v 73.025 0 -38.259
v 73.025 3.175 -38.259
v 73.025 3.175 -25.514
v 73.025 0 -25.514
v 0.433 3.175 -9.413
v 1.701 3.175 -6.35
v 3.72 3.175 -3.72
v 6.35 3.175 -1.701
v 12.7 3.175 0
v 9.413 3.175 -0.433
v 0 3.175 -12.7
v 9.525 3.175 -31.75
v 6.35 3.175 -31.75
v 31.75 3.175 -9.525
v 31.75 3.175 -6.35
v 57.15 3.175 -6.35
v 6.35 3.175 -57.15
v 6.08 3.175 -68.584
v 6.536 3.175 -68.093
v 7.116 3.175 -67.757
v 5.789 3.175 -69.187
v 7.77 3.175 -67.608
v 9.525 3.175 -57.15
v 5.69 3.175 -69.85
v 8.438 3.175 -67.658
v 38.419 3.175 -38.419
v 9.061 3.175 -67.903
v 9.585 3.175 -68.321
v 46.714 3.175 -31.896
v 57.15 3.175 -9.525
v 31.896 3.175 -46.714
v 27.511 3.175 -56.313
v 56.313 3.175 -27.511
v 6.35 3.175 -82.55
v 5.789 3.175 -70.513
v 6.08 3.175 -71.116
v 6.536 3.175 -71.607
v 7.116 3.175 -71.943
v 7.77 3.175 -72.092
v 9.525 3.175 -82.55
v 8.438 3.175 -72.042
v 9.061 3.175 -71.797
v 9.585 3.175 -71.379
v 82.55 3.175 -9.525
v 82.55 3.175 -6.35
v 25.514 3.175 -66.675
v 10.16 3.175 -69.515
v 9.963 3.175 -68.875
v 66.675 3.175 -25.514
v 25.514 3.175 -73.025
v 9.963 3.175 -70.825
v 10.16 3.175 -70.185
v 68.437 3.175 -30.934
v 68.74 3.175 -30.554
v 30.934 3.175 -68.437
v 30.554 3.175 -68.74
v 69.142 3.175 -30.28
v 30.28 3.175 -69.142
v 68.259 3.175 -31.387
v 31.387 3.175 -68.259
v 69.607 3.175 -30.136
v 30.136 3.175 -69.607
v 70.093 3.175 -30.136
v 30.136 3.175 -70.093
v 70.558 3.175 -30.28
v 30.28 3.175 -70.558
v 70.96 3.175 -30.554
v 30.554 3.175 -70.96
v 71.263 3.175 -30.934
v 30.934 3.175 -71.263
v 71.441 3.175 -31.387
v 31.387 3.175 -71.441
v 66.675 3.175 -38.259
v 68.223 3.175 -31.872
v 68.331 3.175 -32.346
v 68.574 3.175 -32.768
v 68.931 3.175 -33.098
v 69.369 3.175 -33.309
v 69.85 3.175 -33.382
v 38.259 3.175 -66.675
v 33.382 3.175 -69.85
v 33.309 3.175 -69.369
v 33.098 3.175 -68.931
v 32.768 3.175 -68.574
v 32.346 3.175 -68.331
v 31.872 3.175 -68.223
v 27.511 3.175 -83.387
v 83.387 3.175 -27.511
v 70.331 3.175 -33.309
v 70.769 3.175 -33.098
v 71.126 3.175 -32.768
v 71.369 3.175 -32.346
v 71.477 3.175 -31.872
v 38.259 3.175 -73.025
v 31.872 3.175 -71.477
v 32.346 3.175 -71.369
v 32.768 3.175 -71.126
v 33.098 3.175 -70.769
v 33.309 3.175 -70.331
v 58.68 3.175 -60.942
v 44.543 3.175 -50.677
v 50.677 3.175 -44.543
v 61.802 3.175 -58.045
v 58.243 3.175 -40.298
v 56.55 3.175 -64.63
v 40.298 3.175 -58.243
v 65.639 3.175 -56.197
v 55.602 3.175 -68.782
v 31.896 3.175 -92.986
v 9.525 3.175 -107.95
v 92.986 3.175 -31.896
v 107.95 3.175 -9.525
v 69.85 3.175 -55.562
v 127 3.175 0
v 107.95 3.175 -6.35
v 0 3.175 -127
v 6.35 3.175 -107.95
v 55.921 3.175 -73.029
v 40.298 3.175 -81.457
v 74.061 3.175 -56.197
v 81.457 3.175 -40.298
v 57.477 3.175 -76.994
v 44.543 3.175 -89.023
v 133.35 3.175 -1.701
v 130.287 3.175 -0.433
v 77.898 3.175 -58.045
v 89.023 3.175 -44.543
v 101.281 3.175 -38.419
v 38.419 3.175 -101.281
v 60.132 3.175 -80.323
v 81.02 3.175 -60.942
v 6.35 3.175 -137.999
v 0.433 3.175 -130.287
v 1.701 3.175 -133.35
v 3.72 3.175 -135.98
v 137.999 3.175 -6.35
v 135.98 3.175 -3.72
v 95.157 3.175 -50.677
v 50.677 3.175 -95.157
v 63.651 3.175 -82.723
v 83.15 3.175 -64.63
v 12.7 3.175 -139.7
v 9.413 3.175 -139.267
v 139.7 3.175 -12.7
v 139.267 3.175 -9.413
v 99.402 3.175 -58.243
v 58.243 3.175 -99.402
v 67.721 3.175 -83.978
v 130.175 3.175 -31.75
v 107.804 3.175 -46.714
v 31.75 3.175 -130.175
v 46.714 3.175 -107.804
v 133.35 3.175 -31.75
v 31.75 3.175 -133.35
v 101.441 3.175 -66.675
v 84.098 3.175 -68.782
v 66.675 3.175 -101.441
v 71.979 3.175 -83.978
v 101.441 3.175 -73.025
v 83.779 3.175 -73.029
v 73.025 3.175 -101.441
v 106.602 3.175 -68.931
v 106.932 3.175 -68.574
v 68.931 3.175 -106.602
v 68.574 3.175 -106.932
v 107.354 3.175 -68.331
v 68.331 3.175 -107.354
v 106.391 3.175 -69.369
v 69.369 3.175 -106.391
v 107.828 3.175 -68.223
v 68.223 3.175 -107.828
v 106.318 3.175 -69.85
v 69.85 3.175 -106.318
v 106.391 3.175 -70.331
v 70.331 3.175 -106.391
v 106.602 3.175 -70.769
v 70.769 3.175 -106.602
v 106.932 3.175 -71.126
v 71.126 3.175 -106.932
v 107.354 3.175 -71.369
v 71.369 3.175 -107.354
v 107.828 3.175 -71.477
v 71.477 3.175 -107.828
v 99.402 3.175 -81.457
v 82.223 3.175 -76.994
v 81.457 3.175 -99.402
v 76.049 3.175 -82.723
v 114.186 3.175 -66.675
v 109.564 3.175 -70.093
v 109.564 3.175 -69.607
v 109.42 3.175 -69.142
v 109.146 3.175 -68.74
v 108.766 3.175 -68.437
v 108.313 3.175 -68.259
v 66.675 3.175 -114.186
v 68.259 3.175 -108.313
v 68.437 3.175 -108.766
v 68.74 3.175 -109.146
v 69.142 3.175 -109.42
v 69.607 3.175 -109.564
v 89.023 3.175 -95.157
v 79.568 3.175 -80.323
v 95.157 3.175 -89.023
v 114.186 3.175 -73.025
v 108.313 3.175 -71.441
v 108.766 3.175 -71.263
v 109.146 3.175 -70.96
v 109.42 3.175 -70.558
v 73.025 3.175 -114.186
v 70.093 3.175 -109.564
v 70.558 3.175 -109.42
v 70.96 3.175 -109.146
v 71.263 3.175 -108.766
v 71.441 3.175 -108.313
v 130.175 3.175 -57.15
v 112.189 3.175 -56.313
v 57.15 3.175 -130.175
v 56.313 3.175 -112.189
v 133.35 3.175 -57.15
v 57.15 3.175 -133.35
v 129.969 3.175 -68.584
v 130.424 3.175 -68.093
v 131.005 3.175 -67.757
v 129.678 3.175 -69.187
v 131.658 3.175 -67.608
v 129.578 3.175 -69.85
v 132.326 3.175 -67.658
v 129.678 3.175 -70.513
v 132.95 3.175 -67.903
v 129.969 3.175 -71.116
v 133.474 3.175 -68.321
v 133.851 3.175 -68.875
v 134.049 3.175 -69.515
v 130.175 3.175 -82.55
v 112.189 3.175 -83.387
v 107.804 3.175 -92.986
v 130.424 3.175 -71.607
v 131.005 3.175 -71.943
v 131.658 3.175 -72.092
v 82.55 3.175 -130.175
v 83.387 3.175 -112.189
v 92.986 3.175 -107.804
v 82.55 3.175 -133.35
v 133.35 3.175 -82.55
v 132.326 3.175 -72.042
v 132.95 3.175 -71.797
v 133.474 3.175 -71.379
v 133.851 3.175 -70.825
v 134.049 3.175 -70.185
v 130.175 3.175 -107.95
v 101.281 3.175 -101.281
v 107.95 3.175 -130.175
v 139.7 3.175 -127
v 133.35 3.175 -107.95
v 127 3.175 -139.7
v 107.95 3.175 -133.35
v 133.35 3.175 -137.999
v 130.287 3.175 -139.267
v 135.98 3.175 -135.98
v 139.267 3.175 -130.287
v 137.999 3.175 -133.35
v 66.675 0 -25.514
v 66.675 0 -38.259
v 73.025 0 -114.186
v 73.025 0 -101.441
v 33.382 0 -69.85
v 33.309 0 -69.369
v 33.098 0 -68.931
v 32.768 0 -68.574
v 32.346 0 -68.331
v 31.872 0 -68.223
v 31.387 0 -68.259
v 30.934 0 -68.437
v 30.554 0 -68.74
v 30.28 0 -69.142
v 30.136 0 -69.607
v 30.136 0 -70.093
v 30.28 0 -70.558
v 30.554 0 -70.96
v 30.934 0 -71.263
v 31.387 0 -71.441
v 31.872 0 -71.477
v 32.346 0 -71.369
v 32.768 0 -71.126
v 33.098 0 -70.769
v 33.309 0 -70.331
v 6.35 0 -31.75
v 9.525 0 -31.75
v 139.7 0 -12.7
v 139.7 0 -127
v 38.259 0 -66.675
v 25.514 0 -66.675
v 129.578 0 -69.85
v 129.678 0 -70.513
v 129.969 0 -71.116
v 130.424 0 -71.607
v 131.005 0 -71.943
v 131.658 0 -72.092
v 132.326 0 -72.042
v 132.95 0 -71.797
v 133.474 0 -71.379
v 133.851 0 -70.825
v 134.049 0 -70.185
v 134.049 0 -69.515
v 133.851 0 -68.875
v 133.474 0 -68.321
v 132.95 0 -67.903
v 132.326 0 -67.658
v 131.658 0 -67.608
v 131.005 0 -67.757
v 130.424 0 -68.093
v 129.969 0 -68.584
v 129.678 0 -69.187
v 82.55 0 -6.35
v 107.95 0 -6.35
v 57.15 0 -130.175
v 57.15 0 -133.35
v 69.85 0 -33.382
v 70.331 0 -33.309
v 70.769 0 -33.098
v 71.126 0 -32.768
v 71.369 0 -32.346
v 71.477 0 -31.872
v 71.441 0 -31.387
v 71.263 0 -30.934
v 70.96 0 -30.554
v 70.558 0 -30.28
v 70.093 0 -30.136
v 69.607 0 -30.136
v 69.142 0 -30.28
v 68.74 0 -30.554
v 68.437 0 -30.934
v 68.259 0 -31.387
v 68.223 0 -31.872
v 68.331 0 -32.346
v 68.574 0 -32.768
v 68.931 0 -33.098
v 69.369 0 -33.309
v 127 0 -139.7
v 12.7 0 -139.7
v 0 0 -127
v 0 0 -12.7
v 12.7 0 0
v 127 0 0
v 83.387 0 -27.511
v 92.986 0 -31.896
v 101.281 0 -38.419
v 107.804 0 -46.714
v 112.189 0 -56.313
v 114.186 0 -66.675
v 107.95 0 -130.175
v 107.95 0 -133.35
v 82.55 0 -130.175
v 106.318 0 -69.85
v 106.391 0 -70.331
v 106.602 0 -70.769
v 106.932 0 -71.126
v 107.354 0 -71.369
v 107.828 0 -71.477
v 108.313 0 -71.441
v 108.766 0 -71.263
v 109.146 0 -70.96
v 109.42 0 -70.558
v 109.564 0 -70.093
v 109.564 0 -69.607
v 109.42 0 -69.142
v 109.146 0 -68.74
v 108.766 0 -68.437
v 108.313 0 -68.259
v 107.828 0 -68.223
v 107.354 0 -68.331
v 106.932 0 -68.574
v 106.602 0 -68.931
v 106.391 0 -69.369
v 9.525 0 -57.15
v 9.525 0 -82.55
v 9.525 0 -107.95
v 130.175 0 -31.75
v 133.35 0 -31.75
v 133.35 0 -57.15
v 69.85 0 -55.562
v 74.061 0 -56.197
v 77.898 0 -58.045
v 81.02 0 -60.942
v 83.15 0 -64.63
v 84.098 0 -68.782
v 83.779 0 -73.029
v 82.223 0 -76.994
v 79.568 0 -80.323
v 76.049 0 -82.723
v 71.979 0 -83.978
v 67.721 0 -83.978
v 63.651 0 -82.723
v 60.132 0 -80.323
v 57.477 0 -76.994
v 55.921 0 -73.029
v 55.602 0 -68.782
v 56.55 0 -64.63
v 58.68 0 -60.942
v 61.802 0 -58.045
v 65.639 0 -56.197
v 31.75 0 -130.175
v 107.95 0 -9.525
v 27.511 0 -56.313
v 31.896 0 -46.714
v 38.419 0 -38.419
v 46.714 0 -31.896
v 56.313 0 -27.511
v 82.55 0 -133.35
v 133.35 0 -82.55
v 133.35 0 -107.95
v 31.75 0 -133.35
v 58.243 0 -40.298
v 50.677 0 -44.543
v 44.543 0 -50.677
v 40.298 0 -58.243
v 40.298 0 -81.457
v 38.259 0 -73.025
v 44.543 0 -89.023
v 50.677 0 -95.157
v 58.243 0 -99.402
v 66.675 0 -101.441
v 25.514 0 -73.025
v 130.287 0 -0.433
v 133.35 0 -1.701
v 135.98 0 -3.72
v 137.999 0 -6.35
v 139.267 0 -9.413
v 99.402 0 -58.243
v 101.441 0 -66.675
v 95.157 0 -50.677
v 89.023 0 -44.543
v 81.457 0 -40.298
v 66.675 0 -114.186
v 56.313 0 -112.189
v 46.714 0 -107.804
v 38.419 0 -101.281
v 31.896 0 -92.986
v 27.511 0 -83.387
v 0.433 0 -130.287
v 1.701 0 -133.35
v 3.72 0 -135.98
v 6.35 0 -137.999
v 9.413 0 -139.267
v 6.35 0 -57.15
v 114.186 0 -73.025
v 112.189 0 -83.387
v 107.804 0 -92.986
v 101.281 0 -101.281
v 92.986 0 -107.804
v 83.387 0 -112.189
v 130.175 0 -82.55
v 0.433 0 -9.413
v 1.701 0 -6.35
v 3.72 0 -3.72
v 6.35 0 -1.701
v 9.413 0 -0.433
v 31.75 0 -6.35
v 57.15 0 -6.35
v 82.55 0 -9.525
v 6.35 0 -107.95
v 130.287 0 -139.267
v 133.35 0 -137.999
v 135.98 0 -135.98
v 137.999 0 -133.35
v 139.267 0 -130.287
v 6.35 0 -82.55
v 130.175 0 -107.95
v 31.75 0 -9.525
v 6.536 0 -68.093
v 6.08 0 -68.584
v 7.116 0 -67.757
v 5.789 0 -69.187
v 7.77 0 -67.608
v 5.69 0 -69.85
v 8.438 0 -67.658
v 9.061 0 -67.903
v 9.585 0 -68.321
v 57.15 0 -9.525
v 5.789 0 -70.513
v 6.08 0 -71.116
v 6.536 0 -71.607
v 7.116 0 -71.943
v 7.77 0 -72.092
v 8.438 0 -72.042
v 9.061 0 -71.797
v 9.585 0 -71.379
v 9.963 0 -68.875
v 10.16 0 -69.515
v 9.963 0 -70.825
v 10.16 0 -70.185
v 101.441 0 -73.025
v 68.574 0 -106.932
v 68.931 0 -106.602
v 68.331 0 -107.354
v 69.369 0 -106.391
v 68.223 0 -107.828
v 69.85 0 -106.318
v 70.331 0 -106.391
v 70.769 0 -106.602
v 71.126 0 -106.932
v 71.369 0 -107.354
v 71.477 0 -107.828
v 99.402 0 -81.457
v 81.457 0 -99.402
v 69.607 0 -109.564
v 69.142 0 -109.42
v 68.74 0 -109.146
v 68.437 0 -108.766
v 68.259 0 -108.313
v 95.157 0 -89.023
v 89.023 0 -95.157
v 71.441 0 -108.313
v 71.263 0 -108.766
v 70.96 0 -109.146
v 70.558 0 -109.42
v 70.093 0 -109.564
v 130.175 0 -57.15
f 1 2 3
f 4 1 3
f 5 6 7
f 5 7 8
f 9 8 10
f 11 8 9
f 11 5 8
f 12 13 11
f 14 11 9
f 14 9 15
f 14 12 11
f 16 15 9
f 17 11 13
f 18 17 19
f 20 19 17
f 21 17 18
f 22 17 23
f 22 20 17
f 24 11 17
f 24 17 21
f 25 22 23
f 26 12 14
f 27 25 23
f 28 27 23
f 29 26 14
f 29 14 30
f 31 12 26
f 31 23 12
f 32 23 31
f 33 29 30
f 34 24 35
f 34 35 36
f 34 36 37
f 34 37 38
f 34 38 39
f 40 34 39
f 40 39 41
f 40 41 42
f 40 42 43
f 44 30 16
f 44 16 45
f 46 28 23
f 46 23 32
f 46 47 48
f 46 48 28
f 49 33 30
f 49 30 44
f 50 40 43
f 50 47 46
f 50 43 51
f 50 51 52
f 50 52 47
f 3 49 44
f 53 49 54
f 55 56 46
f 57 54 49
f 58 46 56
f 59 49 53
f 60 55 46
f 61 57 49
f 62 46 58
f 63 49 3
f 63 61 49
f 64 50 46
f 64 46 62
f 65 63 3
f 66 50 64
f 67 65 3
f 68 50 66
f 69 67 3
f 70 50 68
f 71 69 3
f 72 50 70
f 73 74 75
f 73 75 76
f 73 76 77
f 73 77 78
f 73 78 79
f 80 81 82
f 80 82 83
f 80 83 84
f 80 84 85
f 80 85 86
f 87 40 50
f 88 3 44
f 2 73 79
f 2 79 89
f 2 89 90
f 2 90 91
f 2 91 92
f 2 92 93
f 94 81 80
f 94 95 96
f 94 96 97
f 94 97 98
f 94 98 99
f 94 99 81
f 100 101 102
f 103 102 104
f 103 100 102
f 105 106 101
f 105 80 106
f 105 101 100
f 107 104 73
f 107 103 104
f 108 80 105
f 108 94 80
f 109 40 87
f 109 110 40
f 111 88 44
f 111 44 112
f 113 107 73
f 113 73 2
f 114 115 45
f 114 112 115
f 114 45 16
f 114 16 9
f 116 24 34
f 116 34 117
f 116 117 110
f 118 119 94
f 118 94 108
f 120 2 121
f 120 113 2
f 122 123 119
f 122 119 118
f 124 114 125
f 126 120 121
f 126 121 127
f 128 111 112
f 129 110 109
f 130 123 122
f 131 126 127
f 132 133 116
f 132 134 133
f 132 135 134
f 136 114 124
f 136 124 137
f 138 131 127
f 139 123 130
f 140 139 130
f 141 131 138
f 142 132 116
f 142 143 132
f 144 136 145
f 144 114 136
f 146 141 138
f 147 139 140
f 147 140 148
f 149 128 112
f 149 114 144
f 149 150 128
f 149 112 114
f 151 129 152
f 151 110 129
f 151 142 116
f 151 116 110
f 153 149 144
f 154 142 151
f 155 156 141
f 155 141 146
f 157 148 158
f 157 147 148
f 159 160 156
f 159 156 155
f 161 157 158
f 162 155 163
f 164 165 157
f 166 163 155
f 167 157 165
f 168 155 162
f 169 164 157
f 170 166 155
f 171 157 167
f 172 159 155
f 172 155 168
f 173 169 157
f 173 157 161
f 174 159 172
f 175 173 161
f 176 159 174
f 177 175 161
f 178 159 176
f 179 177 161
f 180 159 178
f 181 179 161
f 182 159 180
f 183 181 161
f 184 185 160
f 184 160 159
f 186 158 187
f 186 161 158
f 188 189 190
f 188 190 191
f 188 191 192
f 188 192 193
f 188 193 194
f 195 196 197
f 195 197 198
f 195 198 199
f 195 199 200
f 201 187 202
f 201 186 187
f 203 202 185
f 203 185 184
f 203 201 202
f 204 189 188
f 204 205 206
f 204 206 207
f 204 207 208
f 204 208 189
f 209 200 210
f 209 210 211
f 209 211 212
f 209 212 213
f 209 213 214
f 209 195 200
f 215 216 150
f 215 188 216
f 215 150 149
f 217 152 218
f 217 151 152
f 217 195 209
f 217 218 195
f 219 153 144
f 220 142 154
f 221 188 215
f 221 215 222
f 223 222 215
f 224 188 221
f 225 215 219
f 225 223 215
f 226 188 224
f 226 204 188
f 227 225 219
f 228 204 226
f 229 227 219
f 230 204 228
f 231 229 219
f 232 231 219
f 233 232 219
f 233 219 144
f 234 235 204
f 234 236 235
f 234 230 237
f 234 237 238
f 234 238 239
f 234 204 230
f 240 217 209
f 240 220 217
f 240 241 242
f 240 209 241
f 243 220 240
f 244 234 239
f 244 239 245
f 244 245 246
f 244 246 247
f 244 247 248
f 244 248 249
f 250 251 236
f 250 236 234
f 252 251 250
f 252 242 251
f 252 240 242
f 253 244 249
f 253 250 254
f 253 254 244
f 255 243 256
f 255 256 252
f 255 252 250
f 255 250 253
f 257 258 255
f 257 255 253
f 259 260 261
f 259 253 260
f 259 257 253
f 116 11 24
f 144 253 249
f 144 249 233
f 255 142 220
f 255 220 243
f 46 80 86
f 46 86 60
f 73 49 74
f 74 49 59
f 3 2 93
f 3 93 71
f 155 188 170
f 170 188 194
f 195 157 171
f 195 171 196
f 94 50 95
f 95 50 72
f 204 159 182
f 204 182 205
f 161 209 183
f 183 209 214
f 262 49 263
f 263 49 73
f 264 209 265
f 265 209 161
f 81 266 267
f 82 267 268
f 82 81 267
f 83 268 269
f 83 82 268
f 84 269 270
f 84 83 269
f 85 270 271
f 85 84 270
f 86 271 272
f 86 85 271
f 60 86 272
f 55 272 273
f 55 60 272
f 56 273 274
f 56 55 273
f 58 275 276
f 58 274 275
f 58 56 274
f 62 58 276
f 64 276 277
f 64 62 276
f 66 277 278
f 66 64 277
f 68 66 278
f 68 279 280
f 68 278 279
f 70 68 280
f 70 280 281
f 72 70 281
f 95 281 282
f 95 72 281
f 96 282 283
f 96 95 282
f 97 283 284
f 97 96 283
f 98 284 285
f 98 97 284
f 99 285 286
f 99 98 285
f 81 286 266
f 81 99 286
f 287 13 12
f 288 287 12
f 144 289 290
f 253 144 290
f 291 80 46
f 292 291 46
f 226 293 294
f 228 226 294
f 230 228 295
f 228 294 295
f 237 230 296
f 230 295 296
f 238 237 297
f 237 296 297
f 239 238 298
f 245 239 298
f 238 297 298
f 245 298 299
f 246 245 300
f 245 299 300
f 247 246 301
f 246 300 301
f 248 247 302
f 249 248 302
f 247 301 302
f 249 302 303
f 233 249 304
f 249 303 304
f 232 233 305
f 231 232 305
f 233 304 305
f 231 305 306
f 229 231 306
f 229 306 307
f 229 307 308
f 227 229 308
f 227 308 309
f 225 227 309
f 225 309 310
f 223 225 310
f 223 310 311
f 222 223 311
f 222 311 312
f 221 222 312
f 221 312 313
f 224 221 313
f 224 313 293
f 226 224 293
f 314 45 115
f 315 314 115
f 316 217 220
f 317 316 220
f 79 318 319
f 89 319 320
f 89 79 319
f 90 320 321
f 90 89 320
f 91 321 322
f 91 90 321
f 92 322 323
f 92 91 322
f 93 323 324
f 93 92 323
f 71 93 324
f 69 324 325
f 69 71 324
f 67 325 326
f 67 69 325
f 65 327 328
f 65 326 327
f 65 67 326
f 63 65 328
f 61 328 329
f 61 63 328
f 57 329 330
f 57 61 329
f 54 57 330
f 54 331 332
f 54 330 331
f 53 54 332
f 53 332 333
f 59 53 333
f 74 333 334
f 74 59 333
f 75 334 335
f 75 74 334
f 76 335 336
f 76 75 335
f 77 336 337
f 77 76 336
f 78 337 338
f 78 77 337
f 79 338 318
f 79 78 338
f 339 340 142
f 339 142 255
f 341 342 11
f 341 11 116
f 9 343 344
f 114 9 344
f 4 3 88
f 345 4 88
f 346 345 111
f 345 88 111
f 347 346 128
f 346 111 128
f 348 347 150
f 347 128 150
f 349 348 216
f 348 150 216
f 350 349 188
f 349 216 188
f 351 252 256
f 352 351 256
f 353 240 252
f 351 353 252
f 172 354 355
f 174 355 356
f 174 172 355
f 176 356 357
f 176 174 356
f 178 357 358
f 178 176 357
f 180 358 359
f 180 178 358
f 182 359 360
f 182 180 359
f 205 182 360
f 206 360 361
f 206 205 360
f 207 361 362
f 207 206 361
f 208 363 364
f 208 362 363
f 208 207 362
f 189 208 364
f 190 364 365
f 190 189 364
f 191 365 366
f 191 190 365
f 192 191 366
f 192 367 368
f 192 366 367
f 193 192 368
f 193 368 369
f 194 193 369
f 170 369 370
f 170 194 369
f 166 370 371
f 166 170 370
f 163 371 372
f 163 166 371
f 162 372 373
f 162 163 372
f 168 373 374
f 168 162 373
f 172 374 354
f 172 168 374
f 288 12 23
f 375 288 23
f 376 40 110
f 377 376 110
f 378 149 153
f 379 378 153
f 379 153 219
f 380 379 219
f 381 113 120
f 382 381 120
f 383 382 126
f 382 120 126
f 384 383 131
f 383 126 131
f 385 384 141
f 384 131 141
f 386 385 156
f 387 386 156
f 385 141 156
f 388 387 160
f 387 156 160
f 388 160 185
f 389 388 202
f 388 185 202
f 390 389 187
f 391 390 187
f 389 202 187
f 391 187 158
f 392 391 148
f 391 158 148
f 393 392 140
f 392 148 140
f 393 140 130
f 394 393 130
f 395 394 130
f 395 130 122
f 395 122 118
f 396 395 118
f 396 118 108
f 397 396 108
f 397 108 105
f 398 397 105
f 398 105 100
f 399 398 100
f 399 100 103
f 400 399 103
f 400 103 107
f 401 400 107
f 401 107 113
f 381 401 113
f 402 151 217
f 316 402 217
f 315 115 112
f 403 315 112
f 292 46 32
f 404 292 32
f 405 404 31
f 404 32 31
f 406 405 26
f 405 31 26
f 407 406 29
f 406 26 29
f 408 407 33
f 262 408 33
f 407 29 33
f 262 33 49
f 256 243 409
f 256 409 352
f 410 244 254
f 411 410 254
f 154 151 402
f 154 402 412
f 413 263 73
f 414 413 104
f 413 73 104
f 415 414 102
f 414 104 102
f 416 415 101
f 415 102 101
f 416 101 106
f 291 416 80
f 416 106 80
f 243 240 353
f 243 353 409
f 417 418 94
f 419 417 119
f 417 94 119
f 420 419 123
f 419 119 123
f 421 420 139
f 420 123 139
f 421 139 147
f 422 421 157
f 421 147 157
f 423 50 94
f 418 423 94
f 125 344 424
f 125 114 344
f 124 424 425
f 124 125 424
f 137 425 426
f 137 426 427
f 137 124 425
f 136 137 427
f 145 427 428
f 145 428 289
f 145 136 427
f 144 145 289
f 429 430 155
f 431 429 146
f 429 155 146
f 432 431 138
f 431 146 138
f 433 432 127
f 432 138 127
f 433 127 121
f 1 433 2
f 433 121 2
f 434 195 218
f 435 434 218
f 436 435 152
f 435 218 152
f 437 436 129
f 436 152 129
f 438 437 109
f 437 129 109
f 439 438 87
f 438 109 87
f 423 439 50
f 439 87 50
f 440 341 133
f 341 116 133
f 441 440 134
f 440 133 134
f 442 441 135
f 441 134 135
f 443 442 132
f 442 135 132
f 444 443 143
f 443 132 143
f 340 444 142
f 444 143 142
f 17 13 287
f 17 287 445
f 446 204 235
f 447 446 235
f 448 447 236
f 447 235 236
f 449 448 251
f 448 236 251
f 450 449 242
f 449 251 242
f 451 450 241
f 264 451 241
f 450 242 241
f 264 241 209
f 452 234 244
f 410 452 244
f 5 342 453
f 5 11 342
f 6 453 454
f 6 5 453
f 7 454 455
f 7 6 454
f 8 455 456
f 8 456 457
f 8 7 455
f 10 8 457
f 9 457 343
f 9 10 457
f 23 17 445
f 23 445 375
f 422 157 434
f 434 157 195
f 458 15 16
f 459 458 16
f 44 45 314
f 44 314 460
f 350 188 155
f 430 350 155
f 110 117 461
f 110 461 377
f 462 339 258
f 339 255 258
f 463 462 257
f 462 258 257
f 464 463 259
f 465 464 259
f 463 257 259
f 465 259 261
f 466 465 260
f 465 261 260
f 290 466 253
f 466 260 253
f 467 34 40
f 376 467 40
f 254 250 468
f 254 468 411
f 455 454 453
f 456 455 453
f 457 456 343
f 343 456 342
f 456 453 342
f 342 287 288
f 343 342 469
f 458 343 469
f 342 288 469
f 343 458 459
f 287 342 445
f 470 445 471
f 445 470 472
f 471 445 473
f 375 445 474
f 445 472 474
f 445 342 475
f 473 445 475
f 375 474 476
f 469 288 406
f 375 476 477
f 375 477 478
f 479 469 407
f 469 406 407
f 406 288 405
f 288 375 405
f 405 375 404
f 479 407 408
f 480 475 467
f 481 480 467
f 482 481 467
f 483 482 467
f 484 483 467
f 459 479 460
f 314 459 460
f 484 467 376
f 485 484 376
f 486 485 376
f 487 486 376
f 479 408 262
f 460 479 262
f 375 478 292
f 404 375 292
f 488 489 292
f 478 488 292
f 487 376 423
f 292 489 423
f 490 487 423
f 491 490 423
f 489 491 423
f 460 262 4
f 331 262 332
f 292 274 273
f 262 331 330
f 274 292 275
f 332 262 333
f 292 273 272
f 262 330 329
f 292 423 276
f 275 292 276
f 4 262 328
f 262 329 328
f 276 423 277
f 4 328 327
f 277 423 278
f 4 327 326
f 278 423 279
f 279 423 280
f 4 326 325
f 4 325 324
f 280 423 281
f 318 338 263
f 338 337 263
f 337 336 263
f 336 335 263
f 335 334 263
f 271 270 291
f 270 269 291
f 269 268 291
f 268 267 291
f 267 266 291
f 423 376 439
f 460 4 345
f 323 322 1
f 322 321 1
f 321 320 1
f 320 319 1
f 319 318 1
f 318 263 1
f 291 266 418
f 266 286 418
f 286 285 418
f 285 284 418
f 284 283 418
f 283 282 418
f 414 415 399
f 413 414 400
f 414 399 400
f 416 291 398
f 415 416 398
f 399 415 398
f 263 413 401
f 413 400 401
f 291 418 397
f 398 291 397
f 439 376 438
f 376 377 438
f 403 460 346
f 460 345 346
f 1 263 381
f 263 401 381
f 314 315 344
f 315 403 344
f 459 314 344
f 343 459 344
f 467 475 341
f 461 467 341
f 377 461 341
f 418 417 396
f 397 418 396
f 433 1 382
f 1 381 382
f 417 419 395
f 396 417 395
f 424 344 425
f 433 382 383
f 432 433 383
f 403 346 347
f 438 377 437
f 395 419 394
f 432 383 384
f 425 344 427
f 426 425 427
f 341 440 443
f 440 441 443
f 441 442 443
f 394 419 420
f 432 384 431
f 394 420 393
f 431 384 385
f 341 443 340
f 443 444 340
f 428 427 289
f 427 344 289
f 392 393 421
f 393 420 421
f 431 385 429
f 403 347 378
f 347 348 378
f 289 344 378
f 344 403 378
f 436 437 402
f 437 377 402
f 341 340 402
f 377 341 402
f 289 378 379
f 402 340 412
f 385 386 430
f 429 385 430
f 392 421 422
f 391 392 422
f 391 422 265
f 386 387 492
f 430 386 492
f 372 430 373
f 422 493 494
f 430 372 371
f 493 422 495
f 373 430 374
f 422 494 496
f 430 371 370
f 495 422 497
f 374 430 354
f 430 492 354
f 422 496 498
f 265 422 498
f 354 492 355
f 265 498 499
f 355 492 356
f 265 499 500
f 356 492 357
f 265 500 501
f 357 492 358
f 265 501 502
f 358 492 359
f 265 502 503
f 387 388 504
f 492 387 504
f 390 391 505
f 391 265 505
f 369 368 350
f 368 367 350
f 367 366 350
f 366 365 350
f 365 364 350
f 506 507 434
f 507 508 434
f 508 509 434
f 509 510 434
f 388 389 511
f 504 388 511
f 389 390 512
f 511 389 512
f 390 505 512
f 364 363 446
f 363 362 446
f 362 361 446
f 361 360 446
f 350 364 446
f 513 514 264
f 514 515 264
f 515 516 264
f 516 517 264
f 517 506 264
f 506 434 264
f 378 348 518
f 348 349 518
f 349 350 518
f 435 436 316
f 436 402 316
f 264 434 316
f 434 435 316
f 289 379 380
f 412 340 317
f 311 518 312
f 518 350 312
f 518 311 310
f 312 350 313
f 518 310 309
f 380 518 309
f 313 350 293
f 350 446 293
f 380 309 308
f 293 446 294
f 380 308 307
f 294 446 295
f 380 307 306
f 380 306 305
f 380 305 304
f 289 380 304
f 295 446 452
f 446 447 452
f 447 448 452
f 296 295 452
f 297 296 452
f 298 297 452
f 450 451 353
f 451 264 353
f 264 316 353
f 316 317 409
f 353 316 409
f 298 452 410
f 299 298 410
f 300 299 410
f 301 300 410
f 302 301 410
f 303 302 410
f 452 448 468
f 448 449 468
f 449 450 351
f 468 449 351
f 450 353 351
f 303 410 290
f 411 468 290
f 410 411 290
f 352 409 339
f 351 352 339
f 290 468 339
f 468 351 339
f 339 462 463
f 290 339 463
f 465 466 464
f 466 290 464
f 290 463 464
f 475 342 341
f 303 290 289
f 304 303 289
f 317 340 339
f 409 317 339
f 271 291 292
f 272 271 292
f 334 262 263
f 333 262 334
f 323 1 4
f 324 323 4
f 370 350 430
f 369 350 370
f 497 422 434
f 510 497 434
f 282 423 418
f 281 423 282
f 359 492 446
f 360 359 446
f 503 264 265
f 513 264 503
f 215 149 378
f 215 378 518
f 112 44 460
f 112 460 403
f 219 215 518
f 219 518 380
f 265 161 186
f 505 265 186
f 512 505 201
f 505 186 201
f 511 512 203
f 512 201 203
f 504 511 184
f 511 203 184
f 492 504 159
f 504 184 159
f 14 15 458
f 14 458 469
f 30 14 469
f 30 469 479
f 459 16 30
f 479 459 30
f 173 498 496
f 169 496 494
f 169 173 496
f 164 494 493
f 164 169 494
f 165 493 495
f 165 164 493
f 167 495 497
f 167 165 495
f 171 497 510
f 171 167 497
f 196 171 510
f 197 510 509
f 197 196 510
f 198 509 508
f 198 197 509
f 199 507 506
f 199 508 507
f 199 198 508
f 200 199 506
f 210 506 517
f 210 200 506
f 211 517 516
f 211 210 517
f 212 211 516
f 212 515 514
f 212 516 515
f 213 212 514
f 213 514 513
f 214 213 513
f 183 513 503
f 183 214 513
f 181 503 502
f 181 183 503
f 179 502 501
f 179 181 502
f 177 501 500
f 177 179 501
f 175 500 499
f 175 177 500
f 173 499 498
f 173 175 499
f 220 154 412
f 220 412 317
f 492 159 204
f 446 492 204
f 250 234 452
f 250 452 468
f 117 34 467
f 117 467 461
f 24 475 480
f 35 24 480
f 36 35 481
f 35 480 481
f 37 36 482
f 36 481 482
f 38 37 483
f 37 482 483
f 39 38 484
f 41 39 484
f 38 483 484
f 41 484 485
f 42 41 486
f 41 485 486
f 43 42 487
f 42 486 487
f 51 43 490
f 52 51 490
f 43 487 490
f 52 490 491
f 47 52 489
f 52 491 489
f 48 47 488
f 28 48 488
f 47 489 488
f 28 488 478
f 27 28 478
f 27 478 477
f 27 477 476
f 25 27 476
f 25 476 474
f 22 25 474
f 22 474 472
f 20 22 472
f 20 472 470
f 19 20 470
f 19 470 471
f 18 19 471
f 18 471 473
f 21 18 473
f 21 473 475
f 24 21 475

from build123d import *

# Parameters (mm, degrees)
SKETCH1_W                 = 139.7
SKETCH1_H                 = 139.7
BOSS_EXTRUDE1_DEPTH       = 3.175
SKETCH13_W                = 25.4
SKETCH13_H                = 3.175
CUT_EXTRUDE6_DEPTH        = 6.35
LPATTERN7_COUNT           = 2
LPATTERN7_PITCH           = 123.825
SKETCH14_W                = 3.175
SKETCH14_H                = 25.4
CUT_EXTRUDE7_DEPTH        = 6.35
F_8_CLEARANCE_HOLE1_D     = 4.4958
F_8_CLEARANCE_HOLE1_DEPTH = 10.16
F_8_CLEARANCE_HOLE1_TIP   = 1.350674586
SKETCH18_R                = 14.2875
CUT_EXTRUDE9_DEPTH        = 7.62
FILLET6_R                 = 12.7
CUT_EXTRUDE17_DEPTH       = 7.62
CIRPATTERN1_COUNT         = 4


with BuildPart() as part:
    # Sketch1 → Boss-Extrude1 (new body)
    with BuildSketch(Plane(origin=(0, 0, 0), x_dir=(1, 0, 0), z_dir=(0, 1, 0))):
        with Locations((69.85, 69.85)):
            Rectangle(SKETCH1_W, SKETCH1_H)
    extrude(amount=BOSS_EXTRUDE1_DEPTH)

    # Sketch13 → Cut-Extrude6 (cut)
    with BuildSketch(Plane(origin=(0, 3.175, 0), x_dir=(1, 0, 0), z_dir=(0, 1, 0))):
        with Locations((44.45, 7.9375)):
            Rectangle(SKETCH13_W, SKETCH13_H)
        with Locations((95.25, 7.9375)):
            Rectangle(SKETCH13_W, SKETCH13_H)
    cut_extrude6 = extrude(amount=-CUT_EXTRUDE6_DEPTH, mode=Mode.SUBTRACT)

    # LPattern7: Cut-Extrude6 ×2
    with Locations(*[(0, 0, -i * LPATTERN7_PITCH) for i in range(1, LPATTERN7_COUNT)]):
        add(cut_extrude6, mode=Mode.SUBTRACT)

    # Sketch14 → Cut-Extrude7 (cut)
    with BuildSketch(Plane(origin=(0, 3.175, 0), x_dir=(1, 0, 0), z_dir=(0, 1, 0))):
        with Locations((7.9375, 44.45)):
            Rectangle(SKETCH14_W, SKETCH14_H)
        with Locations((131.7625, 44.45)):
            Rectangle(SKETCH14_W, SKETCH14_H)
        with Locations((131.7625, 95.25)):
            Rectangle(SKETCH14_W, SKETCH14_H)
        with Locations((7.9375, 95.25)):
            Rectangle(SKETCH14_W, SKETCH14_H)
    extrude(amount=-CUT_EXTRUDE7_DEPTH, mode=Mode.SUBTRACT)

    # #8 Clearance Hole1
    with Locations(Plane(origin=(0, 3.175, 0), x_dir=(1, 0, 0), z_dir=(0, 1, 0))):
        with Locations((7.9375, 69.85), (131.826, 69.85)):
            Hole(F_8_CLEARANCE_HOLE1_D / 2, depth=F_8_CLEARANCE_HOLE1_DEPTH)
            with Locations((0, 0, -(F_8_CLEARANCE_HOLE1_DEPTH + F_8_CLEARANCE_HOLE1_TIP / 2))):  # 118° drill point
                Cone(0, F_8_CLEARANCE_HOLE1_D / 2, F_8_CLEARANCE_HOLE1_TIP, mode=Mode.SUBTRACT)

    # Sketch18 → Cut-Extrude9 (cut)
    with BuildSketch(Plane(origin=(0, 3.175, 0), x_dir=(1, 0, 0), z_dir=(0, 1, 0))):
        with Locations(Location((69.85, 69.85, 0), (0, 0, 270))):
            Circle(SKETCH18_R)
    extrude(amount=-CUT_EXTRUDE9_DEPTH, mode=Mode.SUBTRACT)

    # Fillet6
    fillet6_edges = [part.edges().sort_by_distance(p)[0] for p in [
        (0, 1.5875, -139.7),
        (139.7, 1.5875, -139.7),
        (139.7, 1.5875, 0),
        (0, 1.5875, 0),
    ]]
    fillet(fillet6_edges, radius=FILLET6_R)

    # Sketch26 → Cut-Extrude17 (cut)
    with BuildSketch(Plane(origin=(0, 3.175, 0), x_dir=(1, 0, 0), z_dir=(0, 1, 0))):
        with BuildLine():
            ThreePointArc((66.675, 114.186462139), (38.419103576, 101.280896424), (25.513537861, 73.025))
            Line((25.513537861, 73.025), (38.259148872, 73.025))
            ThreePointArc((38.259148872, 73.025), (47.399359697, 92.300640303), (66.675, 101.440851128))
            Line((66.675, 101.440851128), (66.675, 114.186462139))
        make_face()
        with BuildLine():
            ThreePointArc((25.513537861, 66.675), (38.419103576, 38.419103576), (66.675, 25.513537861))
            Line((66.675, 25.513537861), (66.675, 38.259148872))
            ThreePointArc((66.675, 38.259148872), (47.399359697, 47.399359697), (38.259148872, 66.675))
            Line((38.259148872, 66.675), (25.513537861, 66.675))
        make_face()
        with BuildLine():
            Line((73.025, 38.259148872), (73.025, 25.513537861))
            ThreePointArc((73.025, 25.513537861), (101.280896424, 38.419103576), (114.186462139, 66.675))
            Line((114.186462139, 66.675), (101.440851128, 66.675))
            ThreePointArc((101.440851128, 66.675), (92.300640303, 47.399359697), (73.025, 38.259148872))
        make_face()
        with BuildLine():
            Line((101.440851128, 73.025), (114.186462139, 73.025))
            ThreePointArc((114.186462139, 73.025), (101.280896424, 101.280896424), (73.025, 114.186462139))
            Line((73.025, 114.186462139), (73.025, 101.440851128))
            ThreePointArc((73.025, 101.440851128), (92.300640303, 92.300640303), (101.440851128, 73.025))
        make_face()
    extrude(amount=-CUT_EXTRUDE17_DEPTH, mode=Mode.SUBTRACT)

    # Sketch27 → #4 Clearance Hole1 (revolve, cut)
    with BuildSketch(Plane(origin=(69.85, 3.175, -107.95), x_dir=(0, 0, 1), z_dir=(1, 0, 0))):
        Polygon((0, 0), (0, 11.140574487), (1.63195, 10.16), (1.63195, 0), align=None)
    f_4_clearance_hole1 = revolve(axis=Axis((69.85, 9.525, -107.95), (0, -1, 0)), mode=Mode.SUBTRACT)

    # CirPattern1: #4 Clearance Hole1 ×4 about axis
    cirpattern1_axis = Axis((69.85, 0, -69.85), (0, 1, 0))
    for i in range(1, CIRPATTERN1_COUNT):
        add(f_4_clearance_hole1.rotate(cirpattern1_axis, i * 360 / CIRPATTERN1_COUNT), mode=Mode.SUBTRACT)


solid = part.part
